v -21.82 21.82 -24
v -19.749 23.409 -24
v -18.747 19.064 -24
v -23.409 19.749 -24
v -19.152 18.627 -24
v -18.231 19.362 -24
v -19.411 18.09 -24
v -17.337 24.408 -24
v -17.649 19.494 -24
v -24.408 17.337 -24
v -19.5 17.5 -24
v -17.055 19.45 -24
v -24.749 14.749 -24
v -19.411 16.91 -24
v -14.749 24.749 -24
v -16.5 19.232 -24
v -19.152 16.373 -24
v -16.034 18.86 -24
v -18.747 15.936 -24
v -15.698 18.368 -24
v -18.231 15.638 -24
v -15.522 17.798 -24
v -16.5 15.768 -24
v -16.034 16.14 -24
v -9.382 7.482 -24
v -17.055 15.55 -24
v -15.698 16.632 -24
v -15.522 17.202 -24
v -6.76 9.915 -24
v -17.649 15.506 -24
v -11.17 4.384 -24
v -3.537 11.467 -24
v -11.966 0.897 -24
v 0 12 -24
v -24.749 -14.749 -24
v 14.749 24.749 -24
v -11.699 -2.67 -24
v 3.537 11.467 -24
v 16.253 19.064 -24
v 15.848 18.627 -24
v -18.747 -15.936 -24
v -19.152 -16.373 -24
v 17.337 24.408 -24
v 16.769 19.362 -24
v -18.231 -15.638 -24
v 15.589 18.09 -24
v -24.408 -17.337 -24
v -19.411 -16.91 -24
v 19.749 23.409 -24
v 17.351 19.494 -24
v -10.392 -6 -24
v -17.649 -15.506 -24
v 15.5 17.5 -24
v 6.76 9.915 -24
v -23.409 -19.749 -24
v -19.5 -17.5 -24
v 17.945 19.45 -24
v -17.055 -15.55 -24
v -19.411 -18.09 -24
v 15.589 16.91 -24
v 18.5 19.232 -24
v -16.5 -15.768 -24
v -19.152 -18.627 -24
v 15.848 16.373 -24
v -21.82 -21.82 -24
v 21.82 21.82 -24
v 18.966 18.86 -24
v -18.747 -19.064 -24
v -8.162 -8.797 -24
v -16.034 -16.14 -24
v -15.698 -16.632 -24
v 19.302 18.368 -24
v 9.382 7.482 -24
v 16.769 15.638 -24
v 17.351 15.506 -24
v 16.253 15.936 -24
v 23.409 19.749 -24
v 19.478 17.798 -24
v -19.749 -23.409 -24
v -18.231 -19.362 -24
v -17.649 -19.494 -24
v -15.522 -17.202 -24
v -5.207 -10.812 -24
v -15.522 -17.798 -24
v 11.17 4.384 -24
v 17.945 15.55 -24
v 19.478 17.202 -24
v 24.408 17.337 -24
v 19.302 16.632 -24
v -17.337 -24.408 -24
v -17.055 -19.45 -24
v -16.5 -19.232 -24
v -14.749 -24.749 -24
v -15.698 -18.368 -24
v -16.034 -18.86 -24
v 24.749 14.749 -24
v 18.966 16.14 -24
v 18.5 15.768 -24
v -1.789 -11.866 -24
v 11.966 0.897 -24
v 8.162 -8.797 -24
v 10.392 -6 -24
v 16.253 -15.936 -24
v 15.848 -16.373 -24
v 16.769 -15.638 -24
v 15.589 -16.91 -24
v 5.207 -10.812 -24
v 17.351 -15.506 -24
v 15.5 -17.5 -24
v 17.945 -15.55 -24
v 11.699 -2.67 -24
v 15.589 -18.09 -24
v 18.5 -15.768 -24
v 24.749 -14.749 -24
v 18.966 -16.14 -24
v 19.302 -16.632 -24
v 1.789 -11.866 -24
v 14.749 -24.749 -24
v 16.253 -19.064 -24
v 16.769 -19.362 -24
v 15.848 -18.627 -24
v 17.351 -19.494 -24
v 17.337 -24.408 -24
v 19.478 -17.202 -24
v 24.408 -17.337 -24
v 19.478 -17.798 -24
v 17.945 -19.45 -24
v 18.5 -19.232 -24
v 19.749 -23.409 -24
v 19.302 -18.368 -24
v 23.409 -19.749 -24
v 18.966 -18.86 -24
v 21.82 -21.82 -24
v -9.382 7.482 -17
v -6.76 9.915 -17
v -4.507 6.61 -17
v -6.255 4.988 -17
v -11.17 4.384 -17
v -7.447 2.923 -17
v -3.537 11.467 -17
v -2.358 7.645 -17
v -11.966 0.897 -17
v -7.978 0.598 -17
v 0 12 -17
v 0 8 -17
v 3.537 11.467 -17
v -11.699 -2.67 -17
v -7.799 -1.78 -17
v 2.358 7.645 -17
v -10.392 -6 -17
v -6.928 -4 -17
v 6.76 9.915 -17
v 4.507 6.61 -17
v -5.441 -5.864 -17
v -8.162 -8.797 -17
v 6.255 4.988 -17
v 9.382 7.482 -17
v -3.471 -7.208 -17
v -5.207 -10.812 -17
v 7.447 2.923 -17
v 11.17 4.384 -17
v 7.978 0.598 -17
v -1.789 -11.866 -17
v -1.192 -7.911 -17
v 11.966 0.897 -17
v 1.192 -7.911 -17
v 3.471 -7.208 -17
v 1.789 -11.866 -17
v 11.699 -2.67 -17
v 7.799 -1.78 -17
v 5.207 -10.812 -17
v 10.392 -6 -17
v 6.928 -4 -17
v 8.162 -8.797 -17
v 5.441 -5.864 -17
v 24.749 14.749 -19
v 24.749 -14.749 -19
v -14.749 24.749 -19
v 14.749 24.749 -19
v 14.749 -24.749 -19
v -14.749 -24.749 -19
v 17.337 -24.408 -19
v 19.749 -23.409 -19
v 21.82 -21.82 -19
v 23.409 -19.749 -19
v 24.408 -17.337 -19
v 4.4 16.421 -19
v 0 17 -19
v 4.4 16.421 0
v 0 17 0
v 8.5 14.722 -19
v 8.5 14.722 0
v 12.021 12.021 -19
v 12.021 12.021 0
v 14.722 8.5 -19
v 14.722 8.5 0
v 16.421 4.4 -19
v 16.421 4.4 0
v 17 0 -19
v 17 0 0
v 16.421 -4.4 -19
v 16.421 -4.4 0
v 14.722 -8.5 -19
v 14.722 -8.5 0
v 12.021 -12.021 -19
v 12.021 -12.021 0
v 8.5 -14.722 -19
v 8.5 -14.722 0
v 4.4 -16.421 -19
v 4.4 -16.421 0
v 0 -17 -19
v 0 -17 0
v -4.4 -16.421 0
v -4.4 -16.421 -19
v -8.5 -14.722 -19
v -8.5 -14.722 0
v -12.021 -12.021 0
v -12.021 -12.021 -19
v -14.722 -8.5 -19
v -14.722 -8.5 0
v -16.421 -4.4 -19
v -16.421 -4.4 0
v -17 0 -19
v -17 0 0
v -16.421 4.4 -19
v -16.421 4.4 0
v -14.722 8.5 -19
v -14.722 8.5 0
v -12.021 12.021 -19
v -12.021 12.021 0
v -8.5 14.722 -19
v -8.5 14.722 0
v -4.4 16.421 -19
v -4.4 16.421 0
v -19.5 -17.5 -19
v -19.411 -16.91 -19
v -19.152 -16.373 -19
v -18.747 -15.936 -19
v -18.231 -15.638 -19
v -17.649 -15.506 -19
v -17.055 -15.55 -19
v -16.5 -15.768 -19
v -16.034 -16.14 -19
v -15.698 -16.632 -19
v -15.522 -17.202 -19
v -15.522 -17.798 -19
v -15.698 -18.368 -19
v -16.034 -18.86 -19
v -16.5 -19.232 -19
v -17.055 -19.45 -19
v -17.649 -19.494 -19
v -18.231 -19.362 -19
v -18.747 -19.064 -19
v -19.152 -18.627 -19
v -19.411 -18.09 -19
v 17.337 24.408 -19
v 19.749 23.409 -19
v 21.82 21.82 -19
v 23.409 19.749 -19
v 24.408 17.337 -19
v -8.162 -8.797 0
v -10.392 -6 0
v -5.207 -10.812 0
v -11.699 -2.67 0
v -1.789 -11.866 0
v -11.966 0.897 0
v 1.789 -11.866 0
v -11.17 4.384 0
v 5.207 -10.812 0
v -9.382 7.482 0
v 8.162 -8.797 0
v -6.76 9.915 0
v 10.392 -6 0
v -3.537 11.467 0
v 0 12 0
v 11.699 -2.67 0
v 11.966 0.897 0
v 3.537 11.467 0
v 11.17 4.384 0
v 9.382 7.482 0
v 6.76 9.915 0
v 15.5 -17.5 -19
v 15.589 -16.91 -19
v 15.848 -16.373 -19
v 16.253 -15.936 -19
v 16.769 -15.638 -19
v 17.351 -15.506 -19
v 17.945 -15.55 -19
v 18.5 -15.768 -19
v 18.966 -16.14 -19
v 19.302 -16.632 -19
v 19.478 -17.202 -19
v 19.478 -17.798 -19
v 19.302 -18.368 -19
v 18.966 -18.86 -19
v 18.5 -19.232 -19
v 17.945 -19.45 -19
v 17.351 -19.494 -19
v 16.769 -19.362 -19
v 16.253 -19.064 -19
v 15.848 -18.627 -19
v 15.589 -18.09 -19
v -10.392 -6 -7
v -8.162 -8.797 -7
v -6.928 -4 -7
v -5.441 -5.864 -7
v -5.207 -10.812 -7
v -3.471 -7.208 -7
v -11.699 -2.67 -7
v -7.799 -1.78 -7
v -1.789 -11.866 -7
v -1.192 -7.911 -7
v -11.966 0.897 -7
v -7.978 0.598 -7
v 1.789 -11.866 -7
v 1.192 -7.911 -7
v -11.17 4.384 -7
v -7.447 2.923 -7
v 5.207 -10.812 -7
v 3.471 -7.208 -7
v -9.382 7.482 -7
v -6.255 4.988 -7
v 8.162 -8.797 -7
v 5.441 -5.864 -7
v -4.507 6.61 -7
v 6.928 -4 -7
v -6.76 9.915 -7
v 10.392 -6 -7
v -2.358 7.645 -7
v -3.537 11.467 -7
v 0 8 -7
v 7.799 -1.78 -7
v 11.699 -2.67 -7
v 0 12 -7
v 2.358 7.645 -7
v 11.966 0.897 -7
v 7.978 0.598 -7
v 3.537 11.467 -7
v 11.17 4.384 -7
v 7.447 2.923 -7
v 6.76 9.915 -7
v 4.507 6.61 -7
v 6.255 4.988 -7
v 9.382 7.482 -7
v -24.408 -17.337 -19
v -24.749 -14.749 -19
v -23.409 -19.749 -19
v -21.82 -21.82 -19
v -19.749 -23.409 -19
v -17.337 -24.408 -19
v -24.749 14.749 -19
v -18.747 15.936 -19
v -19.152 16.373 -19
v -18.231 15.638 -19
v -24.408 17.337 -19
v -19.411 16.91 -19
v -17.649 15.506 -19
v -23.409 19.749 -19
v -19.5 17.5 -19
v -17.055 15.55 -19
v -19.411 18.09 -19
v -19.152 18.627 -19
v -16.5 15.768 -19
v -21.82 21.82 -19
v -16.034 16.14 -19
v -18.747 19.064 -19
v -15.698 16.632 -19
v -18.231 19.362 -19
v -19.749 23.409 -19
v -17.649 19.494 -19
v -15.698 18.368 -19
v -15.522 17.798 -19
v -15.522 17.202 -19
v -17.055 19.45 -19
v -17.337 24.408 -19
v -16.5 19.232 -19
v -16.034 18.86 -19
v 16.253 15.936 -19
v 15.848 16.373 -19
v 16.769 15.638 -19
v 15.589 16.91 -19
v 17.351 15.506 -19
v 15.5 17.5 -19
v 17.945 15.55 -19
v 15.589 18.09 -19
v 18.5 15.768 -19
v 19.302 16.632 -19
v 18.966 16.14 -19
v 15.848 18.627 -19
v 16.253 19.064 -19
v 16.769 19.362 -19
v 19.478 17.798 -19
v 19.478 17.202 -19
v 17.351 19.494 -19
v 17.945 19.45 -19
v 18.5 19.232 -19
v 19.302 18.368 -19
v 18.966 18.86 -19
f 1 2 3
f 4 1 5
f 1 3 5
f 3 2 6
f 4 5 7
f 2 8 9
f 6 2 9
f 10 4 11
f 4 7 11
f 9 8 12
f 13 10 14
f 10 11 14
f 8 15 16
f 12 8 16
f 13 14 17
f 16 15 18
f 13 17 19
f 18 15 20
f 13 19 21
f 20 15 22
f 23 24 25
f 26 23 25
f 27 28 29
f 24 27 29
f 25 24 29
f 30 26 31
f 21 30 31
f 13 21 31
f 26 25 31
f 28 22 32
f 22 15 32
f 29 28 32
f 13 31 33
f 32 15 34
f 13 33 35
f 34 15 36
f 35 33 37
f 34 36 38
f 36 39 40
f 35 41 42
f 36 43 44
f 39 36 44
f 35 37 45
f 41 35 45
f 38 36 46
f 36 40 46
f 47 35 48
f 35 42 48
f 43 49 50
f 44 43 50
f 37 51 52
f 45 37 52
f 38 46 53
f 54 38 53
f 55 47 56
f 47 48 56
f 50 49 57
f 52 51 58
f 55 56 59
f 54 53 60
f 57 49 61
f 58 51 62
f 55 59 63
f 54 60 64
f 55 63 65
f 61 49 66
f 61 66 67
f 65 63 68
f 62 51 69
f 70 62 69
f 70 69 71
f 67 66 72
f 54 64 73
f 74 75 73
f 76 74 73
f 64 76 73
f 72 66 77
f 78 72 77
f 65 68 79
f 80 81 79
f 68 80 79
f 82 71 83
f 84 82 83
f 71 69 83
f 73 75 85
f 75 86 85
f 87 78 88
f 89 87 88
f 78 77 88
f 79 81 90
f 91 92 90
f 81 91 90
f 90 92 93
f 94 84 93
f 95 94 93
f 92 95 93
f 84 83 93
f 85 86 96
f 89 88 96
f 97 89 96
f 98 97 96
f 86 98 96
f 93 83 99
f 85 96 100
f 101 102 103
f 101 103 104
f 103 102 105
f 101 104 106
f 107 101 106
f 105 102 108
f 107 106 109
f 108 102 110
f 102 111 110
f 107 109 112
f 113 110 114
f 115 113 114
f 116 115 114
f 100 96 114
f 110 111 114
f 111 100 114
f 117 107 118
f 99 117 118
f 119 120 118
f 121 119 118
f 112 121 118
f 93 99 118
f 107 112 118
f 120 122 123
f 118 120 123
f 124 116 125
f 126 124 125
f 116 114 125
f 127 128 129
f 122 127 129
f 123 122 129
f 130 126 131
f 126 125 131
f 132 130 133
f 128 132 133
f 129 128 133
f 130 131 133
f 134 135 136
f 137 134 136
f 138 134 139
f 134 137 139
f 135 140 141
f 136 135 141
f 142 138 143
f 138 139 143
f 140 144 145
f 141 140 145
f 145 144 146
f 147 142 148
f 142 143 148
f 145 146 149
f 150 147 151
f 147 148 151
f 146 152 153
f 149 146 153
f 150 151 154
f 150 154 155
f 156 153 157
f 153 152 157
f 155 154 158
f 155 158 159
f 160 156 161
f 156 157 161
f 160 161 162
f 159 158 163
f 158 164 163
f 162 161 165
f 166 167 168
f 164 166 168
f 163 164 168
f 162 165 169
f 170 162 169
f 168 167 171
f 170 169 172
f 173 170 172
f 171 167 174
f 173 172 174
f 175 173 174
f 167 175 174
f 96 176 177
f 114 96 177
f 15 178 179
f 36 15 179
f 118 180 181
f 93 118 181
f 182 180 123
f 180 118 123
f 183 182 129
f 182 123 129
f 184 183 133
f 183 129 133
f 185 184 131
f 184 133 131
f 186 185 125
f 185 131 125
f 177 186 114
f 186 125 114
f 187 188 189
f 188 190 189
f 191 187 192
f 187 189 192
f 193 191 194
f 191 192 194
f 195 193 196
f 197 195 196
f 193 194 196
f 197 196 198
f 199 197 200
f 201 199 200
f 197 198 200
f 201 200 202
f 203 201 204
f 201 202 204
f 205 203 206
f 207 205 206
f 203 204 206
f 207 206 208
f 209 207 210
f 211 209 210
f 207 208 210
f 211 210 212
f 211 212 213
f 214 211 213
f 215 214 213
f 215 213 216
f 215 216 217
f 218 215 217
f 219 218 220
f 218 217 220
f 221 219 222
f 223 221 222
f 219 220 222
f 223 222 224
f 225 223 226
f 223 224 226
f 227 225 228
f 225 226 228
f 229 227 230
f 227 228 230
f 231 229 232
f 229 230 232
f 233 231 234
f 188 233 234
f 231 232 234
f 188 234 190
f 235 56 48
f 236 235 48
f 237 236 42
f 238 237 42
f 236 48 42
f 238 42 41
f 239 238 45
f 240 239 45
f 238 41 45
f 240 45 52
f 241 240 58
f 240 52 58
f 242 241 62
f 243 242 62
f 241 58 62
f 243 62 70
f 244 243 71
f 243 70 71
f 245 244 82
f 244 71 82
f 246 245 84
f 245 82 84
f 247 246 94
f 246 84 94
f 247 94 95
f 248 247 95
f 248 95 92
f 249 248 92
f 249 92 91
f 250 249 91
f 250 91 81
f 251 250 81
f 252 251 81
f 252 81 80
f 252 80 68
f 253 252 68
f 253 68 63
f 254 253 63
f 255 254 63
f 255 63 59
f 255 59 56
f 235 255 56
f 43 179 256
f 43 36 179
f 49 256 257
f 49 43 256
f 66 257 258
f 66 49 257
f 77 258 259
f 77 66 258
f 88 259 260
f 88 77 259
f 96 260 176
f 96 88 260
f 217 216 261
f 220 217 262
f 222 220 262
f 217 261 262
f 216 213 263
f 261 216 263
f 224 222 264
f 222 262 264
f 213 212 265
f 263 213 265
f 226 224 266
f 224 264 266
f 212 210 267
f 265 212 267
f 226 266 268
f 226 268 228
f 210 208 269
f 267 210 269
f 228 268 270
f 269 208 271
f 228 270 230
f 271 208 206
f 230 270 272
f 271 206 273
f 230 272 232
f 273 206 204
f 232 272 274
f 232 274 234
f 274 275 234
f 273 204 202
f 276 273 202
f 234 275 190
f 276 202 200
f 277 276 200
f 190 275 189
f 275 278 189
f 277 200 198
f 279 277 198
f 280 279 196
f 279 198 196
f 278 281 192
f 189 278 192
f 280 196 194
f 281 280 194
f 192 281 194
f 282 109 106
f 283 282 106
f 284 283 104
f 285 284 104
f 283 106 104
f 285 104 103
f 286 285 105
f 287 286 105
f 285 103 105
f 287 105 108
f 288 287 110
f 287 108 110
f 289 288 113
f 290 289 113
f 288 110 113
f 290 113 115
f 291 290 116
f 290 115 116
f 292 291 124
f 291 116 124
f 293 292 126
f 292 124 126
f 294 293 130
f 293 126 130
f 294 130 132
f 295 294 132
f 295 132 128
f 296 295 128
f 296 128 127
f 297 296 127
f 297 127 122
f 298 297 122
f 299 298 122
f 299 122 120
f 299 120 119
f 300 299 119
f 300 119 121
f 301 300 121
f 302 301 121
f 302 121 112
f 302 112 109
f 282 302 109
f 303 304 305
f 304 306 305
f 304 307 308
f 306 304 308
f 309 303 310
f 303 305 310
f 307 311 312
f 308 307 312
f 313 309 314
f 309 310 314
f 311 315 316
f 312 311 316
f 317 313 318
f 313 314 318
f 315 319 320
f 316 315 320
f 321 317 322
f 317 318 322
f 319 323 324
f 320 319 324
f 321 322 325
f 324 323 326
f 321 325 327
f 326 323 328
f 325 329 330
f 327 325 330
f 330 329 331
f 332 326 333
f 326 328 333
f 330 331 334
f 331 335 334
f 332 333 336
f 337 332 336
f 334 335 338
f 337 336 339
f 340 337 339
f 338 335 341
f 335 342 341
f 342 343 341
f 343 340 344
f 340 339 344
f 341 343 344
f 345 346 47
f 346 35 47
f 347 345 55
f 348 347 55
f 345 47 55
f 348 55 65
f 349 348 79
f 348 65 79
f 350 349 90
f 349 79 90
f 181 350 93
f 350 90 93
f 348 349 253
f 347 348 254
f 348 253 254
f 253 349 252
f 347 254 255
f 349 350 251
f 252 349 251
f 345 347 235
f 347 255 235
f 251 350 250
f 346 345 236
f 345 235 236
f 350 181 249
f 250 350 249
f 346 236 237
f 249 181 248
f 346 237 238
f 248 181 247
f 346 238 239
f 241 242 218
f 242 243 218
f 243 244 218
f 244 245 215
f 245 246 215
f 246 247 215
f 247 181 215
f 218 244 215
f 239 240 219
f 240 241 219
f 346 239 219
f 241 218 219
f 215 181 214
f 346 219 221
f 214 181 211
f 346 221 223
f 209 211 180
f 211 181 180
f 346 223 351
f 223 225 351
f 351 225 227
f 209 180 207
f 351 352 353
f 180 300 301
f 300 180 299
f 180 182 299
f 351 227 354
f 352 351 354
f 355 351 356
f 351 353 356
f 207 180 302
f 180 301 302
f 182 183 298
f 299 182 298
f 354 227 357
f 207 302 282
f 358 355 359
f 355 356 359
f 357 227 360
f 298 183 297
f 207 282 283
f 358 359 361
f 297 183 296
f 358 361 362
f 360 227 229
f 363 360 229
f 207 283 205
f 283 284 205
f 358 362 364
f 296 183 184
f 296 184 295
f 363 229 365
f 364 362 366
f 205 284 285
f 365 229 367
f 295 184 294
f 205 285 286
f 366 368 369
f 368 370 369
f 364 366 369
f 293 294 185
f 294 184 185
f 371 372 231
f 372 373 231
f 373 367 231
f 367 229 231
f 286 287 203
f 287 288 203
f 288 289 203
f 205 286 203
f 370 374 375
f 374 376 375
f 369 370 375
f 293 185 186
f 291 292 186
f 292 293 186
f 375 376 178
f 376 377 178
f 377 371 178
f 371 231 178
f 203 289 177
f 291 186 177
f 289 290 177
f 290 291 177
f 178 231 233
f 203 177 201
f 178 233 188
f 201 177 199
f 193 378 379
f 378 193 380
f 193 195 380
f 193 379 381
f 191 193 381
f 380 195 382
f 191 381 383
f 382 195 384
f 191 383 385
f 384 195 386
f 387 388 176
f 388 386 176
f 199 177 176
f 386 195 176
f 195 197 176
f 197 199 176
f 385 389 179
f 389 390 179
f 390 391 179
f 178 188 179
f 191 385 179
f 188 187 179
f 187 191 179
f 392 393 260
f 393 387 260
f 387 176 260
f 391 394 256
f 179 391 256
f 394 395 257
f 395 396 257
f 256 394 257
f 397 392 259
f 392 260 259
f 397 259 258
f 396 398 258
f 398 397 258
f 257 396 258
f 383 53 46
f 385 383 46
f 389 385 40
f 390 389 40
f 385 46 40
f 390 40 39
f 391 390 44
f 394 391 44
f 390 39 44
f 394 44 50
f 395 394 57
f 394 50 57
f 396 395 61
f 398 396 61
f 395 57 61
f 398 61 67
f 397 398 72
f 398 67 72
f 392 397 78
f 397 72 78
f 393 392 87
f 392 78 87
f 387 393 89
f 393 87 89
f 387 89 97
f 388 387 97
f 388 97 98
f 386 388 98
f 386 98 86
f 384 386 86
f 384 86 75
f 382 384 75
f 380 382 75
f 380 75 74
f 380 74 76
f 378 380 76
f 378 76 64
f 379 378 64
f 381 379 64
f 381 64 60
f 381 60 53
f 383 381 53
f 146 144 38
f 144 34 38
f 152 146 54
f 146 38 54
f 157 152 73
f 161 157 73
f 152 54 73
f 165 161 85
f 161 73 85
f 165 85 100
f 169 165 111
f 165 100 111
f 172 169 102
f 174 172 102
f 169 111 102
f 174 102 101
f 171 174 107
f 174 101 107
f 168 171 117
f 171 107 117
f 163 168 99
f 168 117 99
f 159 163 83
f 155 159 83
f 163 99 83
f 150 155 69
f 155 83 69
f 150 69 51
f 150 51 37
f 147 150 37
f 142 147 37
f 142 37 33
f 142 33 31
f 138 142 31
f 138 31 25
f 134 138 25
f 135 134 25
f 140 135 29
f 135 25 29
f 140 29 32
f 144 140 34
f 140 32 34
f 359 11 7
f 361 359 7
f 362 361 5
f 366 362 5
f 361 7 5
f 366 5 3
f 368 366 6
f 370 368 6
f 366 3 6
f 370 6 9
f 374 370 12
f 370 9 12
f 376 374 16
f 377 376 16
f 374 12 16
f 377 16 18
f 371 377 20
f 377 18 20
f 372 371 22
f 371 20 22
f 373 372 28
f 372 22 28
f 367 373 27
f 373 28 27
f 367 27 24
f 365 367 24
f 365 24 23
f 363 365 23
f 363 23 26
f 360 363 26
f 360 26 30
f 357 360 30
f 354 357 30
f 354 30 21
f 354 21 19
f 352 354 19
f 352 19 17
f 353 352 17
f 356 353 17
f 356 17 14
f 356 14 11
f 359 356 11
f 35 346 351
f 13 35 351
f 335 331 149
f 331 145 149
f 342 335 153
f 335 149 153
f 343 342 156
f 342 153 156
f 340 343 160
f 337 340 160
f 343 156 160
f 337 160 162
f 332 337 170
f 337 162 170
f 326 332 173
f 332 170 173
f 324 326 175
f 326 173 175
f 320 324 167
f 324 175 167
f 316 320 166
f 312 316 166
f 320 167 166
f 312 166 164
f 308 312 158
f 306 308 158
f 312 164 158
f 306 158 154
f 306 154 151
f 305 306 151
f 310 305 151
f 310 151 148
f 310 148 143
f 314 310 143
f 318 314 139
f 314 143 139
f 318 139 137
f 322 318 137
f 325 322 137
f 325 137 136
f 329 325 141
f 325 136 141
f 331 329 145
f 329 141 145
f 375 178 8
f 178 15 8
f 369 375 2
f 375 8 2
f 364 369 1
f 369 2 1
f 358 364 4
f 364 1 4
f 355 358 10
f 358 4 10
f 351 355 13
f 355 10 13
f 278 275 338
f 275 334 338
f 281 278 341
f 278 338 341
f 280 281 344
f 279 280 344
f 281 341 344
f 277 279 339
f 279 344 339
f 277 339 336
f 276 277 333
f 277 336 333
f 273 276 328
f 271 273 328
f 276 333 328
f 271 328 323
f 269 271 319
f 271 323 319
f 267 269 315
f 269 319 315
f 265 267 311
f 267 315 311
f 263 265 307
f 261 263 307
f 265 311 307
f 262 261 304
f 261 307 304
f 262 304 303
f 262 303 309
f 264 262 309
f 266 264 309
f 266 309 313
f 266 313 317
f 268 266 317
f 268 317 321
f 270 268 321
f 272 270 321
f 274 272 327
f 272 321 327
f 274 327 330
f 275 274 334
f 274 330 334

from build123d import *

# Parameters (mm, degrees)
CUT_EXTRUDE1_DEPTH = 10
FILLET1_R          = 10
SKETCH5_R          = 2
CUT_EXTRUDE2_DEPTH = 10


with BuildPart() as part:
    # Sketch3 → Revolve1 (revolve)
    with BuildSketch(Plane(origin=(0, 0, 0), x_dir=(0, 0, -1), z_dir=(1, 0, 0))):
        Polygon((0, 12), (7, 12), (7, 8), (17, 8), (17, 12), (24, 12), (24, 35), (19, 35), (19, 17), (0, 17), align=None)
    revolve(axis=Axis((0, 0, 0), (0, 0, -1)))

    # Sketch4 → Cut-Extrude1 (cut)
    with BuildSketch(Plane.XY.offset(-19)):
        with BuildLine():
            ThreePointArc((35, 0), (32.335783638, 13.393920133), (24.748737342, 24.748737342))
            Line((24.748737342, 24.748737342), (24.748737342, -24.748737342))
            ThreePointArc((24.748737342, -24.748737342), (32.335783638, -13.393920133), (35, 0))
        make_face()
        with BuildLine():
            ThreePointArc((24.748737342, 24.748737342), (0, 35), (-24.748737342, 24.748737342))
            Line((-24.748737342, 24.748737342), (24.748737342, 24.748737342))
        make_face()
        with BuildLine():
            Line((-24.748737342, -24.748737342), (-24.748737342, 24.748737342))
            ThreePointArc((-24.748737342, 24.748737342), (-35, 0), (-24.748737342, -24.748737342))
        make_face()
        with BuildLine():
            Line((24.748737342, -24.748737342), (-24.748737342, -24.748737342))
            ThreePointArc((-24.748737342, -24.748737342), (0, -35), (24.748737342, -24.748737342))
        make_face()
    extrude(amount=-CUT_EXTRUDE1_DEPTH, mode=Mode.SUBTRACT)

    # Fillet1
    fillet1_edges = [part.edges().sort_by_distance(p)[0] for p in [
        (24.748737342, 24.748737342, -21.5),
        (24.748737342, -24.748737342, -21.5),
        (-24.748737342, 24.748737342, -21.5),
        (-24.748737342, -24.748737342, -21.5),
    ]]
    fillet(fillet1_edges, radius=FILLET1_R)

    # Sketch5 → Cut-Extrude2 (cut)
    with BuildSketch(Plane(origin=(0, 0, -24), x_dir=(-1, 0, 0), z_dir=(0, 0, -1))):
        with Locations((-17.5, 17.5)):
            Circle(SKETCH5_R)
        with Locations((17.5, 17.5)):
            Circle(SKETCH5_R)
        with Locations((17.5, -17.5)):
            Circle(SKETCH5_R)
        with Locations((-17.5, -17.5)):
            Circle(SKETCH5_R)
    extrude(amount=-CUT_EXTRUDE2_DEPTH, mode=Mode.SUBTRACT)


solid = part.part
